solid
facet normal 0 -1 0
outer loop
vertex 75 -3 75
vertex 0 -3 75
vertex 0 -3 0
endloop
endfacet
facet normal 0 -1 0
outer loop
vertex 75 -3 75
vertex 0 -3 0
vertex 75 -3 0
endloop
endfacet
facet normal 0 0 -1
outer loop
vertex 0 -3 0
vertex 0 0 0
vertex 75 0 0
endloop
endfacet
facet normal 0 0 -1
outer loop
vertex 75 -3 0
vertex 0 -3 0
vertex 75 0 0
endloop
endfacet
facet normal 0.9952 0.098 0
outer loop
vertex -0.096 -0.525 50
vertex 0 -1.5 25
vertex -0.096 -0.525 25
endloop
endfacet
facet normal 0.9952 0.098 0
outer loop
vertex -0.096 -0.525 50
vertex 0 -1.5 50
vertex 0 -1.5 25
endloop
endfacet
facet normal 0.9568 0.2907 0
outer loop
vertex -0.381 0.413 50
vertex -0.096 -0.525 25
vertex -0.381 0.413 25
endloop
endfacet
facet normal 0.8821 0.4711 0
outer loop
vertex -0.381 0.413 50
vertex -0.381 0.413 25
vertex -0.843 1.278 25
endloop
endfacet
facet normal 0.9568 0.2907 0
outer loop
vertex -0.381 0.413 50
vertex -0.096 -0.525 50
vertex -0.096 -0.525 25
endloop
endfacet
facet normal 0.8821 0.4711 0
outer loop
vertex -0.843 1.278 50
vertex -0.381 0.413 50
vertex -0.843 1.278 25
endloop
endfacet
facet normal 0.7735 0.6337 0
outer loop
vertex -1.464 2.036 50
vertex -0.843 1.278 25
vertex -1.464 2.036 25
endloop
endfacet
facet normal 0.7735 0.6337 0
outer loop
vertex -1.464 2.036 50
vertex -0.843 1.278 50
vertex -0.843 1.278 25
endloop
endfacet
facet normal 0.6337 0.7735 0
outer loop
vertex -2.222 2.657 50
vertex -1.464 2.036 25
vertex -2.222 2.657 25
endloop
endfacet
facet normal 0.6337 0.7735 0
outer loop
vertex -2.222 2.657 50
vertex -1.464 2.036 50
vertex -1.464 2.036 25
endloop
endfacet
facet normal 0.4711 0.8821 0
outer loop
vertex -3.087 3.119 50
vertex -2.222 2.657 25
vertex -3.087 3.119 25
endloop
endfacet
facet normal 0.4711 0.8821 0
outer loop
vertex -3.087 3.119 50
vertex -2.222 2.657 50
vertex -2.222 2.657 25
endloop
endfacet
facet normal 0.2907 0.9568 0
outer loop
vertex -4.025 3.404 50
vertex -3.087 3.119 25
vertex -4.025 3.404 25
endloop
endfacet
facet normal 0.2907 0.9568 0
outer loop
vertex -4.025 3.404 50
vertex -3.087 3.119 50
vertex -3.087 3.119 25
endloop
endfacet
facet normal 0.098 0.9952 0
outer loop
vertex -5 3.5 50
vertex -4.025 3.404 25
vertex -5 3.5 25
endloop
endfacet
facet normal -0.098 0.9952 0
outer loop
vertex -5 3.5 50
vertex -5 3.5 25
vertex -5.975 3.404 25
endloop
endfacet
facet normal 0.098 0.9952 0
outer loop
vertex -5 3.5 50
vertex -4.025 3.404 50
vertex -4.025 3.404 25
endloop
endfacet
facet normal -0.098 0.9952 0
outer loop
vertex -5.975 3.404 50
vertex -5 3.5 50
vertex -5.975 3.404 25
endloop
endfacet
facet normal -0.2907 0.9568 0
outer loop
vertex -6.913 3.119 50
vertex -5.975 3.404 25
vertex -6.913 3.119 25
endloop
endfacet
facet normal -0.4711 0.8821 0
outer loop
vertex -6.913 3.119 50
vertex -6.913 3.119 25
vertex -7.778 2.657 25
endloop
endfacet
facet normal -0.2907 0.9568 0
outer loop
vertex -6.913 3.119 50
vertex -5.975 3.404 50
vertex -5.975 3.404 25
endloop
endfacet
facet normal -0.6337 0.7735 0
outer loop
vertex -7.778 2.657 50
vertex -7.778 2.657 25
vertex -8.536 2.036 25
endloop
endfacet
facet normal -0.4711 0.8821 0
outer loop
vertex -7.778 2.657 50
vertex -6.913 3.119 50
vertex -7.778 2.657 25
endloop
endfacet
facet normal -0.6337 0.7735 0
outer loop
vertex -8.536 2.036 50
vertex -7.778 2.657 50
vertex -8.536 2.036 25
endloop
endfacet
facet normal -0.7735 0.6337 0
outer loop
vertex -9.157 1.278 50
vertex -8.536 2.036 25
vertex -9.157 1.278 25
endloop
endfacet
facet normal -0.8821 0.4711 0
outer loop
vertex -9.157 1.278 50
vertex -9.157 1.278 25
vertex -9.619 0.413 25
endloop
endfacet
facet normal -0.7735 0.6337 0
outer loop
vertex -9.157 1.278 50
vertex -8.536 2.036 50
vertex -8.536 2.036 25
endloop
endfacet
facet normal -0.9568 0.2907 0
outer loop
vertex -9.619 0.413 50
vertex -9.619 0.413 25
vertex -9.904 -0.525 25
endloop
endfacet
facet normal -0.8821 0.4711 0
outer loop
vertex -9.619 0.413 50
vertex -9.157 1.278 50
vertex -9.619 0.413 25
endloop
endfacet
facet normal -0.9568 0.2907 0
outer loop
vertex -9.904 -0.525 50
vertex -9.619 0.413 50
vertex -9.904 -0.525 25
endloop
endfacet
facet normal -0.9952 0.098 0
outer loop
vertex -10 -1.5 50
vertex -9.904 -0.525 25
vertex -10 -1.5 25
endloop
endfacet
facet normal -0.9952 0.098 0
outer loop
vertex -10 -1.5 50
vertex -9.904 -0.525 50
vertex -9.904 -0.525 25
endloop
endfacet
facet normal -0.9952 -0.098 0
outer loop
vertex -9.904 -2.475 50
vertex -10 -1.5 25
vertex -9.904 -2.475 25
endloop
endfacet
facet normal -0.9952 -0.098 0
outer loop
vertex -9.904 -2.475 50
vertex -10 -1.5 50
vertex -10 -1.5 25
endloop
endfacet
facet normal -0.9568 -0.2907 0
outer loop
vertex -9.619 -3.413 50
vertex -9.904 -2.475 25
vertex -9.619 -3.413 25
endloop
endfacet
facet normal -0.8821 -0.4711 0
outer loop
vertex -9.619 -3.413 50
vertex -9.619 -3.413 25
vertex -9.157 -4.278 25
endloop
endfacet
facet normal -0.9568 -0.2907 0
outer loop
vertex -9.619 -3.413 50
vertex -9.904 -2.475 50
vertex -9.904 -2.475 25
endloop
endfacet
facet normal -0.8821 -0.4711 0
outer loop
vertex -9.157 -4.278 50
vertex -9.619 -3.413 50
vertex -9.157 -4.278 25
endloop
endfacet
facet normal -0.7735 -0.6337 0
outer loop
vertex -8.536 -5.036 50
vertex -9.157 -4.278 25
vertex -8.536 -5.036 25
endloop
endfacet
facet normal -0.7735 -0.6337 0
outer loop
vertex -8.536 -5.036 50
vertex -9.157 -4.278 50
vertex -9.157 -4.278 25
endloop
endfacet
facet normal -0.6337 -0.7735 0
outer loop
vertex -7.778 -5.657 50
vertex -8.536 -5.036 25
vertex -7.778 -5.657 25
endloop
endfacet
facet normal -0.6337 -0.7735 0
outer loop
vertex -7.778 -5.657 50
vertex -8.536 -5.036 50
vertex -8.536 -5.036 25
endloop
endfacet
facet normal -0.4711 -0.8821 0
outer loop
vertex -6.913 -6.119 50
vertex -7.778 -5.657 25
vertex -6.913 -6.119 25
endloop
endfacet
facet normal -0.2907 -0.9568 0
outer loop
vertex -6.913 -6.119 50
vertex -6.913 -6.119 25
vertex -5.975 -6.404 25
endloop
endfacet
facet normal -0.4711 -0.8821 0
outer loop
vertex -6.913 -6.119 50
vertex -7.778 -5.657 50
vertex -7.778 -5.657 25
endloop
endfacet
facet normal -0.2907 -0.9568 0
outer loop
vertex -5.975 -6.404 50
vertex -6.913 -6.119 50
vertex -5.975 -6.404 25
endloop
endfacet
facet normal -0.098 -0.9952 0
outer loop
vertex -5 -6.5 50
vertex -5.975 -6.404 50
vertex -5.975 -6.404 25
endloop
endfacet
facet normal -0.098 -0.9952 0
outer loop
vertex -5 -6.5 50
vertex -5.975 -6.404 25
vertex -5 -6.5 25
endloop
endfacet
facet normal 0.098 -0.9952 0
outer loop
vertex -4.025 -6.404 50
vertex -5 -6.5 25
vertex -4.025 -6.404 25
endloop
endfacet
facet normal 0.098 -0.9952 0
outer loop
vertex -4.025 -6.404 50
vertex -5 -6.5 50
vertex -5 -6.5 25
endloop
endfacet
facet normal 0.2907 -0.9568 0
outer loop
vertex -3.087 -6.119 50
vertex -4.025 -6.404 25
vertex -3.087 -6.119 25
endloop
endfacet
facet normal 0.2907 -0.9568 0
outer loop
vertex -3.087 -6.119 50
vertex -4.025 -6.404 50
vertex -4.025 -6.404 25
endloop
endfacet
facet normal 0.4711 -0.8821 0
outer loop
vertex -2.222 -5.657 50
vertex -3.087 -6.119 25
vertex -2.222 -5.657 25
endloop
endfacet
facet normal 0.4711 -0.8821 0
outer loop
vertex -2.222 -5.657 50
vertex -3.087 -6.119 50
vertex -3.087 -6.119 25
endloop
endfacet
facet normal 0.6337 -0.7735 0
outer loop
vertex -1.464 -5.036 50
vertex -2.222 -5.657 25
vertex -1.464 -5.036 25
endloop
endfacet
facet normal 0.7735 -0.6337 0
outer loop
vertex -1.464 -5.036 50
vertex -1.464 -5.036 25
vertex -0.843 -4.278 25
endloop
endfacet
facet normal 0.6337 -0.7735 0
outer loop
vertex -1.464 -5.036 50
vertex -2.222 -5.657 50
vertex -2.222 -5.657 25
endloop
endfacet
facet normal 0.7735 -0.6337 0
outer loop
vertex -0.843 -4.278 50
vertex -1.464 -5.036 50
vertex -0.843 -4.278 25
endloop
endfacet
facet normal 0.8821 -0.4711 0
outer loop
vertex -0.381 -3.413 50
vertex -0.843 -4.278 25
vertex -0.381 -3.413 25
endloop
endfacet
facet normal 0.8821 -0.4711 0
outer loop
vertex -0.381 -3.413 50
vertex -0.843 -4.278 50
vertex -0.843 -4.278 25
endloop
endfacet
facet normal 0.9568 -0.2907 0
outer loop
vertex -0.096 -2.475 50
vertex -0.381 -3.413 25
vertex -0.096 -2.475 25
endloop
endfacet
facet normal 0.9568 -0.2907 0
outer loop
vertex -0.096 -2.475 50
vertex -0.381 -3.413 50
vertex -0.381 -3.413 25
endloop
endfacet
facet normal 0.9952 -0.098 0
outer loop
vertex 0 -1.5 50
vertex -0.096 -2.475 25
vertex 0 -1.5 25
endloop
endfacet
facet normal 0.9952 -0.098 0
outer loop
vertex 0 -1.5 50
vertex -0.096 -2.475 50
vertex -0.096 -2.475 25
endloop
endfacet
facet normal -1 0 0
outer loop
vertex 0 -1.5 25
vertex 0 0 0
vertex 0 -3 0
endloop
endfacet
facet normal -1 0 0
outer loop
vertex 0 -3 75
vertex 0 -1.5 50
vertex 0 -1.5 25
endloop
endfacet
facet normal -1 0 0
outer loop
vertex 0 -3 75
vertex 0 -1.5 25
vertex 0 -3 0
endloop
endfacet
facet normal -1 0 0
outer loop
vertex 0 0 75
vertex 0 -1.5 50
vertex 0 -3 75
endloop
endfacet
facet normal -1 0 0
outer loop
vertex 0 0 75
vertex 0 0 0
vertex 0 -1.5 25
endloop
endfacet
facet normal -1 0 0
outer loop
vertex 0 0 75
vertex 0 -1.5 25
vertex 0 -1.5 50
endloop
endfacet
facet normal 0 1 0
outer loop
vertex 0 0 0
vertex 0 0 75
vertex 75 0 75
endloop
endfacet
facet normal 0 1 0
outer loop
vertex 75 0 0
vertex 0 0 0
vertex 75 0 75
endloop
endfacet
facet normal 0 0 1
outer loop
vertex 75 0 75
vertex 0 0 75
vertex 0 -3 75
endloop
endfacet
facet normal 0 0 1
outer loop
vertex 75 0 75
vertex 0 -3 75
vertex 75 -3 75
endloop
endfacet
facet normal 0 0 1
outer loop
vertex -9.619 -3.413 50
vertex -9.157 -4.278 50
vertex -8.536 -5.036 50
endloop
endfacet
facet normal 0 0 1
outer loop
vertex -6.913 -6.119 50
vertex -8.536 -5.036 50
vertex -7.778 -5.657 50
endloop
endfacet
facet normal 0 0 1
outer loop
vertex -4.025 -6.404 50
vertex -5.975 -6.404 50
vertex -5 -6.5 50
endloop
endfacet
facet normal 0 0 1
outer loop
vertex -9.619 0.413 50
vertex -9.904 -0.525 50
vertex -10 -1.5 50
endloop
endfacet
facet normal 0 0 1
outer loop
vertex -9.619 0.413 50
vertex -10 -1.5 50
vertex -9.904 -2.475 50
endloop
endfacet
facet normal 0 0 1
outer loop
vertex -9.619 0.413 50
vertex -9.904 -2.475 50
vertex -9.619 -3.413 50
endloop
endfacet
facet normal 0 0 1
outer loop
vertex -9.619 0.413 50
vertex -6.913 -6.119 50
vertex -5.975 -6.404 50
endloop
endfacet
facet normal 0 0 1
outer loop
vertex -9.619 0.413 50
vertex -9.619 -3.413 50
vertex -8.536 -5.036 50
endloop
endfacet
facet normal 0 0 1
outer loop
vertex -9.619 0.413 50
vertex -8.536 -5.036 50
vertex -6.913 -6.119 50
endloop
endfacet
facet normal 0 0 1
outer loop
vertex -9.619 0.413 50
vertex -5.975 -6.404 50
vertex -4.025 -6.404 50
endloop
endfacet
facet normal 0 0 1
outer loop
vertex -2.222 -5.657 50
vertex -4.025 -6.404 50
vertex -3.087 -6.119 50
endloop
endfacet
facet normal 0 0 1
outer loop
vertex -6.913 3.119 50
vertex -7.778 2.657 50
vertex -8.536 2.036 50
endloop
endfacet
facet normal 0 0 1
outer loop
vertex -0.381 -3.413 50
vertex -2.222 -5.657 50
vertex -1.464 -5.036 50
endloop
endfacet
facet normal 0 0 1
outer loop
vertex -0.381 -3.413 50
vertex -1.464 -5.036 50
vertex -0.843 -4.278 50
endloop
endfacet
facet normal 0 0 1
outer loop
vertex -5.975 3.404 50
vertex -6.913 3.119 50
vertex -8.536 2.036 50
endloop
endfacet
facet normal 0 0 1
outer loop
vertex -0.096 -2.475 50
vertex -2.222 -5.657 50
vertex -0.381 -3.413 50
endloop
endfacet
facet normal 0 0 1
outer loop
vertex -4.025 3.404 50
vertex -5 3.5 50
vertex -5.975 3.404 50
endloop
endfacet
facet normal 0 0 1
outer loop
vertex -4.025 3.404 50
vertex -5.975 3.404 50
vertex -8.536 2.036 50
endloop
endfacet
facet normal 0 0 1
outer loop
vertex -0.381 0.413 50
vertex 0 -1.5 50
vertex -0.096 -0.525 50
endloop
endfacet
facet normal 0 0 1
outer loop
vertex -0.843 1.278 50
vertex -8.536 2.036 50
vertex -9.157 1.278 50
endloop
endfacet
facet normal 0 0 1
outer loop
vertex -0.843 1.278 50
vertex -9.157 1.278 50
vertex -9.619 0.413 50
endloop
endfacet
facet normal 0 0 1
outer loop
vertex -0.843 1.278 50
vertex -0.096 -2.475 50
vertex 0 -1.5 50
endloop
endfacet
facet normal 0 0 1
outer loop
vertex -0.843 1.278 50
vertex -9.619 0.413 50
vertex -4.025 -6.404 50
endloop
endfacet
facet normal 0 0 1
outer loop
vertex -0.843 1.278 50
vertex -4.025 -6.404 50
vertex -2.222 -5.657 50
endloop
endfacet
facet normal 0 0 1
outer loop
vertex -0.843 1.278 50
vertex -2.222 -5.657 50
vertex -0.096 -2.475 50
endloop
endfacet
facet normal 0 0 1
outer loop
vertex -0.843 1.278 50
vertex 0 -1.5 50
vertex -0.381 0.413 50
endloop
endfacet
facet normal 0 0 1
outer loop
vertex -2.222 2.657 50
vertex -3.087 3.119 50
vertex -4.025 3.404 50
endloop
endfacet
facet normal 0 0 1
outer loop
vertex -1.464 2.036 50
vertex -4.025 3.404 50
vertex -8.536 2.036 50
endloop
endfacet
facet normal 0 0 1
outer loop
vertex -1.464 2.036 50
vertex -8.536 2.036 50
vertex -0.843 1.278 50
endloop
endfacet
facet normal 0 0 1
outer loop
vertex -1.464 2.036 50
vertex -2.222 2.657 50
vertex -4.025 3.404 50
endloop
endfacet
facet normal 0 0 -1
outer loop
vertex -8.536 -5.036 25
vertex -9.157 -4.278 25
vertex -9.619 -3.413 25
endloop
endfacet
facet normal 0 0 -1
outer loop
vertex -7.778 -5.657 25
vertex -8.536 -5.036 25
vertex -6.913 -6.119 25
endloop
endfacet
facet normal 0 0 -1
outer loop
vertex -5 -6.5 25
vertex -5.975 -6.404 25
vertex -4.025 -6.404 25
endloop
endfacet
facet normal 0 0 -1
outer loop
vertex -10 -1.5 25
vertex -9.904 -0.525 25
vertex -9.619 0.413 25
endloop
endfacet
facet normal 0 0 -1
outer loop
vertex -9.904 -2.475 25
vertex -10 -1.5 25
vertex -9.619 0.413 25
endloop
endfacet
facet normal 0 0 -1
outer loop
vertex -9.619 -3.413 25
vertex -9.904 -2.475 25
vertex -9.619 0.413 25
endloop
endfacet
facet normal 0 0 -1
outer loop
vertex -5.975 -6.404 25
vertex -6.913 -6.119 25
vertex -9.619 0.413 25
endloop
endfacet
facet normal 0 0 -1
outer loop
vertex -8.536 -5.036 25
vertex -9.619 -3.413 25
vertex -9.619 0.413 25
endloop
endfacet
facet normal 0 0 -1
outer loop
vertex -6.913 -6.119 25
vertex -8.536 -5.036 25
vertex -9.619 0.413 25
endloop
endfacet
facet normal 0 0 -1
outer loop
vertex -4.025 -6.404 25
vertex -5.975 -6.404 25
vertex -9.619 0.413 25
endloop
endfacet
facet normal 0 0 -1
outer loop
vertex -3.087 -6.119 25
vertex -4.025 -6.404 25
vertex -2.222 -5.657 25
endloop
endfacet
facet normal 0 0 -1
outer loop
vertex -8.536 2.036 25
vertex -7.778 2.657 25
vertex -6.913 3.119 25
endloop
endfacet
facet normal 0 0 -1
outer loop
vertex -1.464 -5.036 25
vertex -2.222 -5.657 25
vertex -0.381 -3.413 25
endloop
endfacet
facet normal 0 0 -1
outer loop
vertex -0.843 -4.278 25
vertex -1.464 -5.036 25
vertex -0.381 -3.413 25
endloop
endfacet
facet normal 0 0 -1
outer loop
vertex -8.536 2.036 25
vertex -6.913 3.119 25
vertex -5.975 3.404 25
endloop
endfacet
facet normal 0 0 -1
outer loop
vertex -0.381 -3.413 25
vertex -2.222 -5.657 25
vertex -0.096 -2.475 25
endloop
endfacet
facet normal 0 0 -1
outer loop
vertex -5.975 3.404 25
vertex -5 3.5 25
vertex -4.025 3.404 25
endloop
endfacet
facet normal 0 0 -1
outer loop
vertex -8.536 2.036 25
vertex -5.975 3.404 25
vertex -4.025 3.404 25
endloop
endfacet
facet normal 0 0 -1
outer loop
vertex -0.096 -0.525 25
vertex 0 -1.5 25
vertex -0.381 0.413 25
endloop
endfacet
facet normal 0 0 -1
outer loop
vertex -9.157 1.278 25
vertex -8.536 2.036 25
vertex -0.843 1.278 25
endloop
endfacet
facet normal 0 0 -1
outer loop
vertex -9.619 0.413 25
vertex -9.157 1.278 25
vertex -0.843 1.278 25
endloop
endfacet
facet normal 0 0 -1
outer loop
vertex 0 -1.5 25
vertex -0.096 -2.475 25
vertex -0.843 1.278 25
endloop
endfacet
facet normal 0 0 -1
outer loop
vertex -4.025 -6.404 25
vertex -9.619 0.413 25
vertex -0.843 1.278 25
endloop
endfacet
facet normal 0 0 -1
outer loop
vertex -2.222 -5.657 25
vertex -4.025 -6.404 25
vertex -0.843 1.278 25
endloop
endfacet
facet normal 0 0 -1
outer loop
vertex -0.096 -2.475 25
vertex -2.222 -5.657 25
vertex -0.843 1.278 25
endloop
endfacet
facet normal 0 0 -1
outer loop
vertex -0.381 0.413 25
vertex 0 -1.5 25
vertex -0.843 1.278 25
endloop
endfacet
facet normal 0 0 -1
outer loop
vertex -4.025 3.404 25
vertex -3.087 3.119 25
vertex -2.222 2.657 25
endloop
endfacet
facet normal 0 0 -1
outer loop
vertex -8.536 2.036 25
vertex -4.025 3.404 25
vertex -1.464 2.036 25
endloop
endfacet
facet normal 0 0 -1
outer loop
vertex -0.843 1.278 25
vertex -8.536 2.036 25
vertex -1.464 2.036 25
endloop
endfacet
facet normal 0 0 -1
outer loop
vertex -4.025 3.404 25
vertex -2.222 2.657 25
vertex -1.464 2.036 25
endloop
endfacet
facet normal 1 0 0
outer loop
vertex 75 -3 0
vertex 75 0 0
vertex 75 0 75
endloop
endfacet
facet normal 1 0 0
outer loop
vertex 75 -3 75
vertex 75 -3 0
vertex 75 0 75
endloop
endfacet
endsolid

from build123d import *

# Parameters (mm, degrees)
F0_W     = 75
F0_H     = 75
F1_DEPTH = 3
F3_R     = 5
F4_DEPTH = 12.5


with BuildPart() as f1:
    # F0 (on Front) → F1 (new body)
    with BuildSketch(Plane.XZ):
        with Locations((37.5, 37.5)):
            Rectangle(F0_W, F0_H)
    extrude(amount=F1_DEPTH)

    # F3 (on offset) → F4 (join, symmetric)
    with BuildSketch(Plane.XY.offset(37.5)):
        with Locations((-5, -1.5)):
            Circle(F3_R)
    extrude(amount=F4_DEPTH, both=True)


solid = f1.part
